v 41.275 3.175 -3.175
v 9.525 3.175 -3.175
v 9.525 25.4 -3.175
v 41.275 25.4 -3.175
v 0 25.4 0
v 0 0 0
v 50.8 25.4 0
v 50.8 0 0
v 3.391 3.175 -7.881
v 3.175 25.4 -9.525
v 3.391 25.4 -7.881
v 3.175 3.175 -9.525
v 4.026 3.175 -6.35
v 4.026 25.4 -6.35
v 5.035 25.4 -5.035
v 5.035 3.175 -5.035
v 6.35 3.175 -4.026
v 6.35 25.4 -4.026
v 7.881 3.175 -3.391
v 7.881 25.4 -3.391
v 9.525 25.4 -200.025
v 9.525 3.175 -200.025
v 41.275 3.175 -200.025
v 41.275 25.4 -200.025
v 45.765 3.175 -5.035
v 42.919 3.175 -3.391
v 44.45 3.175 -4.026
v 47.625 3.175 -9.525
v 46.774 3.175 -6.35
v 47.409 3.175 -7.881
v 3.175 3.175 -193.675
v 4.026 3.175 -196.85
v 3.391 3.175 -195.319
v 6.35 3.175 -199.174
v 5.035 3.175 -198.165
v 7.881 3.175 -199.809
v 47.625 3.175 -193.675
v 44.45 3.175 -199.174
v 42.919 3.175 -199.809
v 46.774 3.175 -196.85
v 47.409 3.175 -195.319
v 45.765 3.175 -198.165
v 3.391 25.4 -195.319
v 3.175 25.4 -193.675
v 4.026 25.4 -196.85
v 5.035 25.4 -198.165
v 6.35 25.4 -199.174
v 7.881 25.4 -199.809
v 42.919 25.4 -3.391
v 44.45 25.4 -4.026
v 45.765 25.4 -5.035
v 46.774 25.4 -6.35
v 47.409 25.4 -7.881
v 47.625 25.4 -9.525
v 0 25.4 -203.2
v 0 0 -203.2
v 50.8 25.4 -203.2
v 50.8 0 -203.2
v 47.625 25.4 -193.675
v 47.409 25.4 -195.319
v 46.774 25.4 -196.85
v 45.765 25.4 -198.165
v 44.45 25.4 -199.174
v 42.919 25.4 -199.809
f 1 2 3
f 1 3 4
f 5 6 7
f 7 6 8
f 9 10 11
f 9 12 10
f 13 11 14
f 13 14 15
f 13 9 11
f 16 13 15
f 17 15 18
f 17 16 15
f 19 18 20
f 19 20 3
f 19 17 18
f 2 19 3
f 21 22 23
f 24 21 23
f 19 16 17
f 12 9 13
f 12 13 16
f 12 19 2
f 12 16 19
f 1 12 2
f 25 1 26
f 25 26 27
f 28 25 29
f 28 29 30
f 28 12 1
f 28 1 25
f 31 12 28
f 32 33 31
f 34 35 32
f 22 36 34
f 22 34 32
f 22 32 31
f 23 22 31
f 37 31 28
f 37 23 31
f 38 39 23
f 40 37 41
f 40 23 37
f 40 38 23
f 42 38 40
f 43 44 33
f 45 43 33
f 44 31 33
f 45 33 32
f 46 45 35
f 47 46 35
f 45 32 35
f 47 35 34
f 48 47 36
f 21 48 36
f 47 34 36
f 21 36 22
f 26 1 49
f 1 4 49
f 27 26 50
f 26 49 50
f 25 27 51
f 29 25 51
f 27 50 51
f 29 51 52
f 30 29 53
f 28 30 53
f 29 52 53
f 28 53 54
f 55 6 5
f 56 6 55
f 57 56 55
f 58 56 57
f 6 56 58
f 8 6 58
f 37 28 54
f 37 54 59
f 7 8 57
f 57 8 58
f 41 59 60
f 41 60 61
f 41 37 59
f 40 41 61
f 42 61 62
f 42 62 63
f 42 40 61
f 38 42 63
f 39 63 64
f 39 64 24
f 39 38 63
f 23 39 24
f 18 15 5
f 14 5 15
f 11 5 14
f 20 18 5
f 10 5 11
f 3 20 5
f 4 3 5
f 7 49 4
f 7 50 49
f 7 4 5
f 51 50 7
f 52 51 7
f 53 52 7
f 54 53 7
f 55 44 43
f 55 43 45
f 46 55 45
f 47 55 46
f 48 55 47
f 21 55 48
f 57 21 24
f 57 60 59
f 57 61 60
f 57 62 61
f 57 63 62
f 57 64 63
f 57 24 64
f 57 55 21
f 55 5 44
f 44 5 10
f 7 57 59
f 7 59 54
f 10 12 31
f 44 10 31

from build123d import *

# Parameters (mm, degrees)
SKETCH1_W           = 50.8
SKETCH1_H           = 203.2
BOSS_EXTRUDE1_DEPTH = 25.4
SHELL1_T            = -3.175
FILLET1_R           = 6.35


with BuildPart() as part:
    # Sketch1 → Boss-Extrude1 (new body)
    with BuildSketch(Plane(origin=(0, 0, 0), x_dir=(1, 0, 0), z_dir=(0, 1, 0))):
        with Locations((25.4, 101.6)):
            Rectangle(SKETCH1_W, SKETCH1_H)
    extrude(amount=BOSS_EXTRUDE1_DEPTH)

    # Shell1
    shell1_openings = [part.faces().sort_by_distance(p)[0] for p in [
        (25.4, 25.4, -101.6),
    ]]
    offset(amount=SHELL1_T, openings=shell1_openings, kind=Kind.INTERSECTION)

    # Fillet1
    fillet1_edges = [part.edges().sort_by_distance(p)[0] for p in [
        (3.175, 14.2875, -200.025),
        (3.175, 14.2875, -3.175),
        (47.625, 14.2875, -3.175),
        (47.625, 14.2875, -200.025),
    ]]
    fillet(fillet1_edges, radius=FILLET1_R)


solid = part.part
